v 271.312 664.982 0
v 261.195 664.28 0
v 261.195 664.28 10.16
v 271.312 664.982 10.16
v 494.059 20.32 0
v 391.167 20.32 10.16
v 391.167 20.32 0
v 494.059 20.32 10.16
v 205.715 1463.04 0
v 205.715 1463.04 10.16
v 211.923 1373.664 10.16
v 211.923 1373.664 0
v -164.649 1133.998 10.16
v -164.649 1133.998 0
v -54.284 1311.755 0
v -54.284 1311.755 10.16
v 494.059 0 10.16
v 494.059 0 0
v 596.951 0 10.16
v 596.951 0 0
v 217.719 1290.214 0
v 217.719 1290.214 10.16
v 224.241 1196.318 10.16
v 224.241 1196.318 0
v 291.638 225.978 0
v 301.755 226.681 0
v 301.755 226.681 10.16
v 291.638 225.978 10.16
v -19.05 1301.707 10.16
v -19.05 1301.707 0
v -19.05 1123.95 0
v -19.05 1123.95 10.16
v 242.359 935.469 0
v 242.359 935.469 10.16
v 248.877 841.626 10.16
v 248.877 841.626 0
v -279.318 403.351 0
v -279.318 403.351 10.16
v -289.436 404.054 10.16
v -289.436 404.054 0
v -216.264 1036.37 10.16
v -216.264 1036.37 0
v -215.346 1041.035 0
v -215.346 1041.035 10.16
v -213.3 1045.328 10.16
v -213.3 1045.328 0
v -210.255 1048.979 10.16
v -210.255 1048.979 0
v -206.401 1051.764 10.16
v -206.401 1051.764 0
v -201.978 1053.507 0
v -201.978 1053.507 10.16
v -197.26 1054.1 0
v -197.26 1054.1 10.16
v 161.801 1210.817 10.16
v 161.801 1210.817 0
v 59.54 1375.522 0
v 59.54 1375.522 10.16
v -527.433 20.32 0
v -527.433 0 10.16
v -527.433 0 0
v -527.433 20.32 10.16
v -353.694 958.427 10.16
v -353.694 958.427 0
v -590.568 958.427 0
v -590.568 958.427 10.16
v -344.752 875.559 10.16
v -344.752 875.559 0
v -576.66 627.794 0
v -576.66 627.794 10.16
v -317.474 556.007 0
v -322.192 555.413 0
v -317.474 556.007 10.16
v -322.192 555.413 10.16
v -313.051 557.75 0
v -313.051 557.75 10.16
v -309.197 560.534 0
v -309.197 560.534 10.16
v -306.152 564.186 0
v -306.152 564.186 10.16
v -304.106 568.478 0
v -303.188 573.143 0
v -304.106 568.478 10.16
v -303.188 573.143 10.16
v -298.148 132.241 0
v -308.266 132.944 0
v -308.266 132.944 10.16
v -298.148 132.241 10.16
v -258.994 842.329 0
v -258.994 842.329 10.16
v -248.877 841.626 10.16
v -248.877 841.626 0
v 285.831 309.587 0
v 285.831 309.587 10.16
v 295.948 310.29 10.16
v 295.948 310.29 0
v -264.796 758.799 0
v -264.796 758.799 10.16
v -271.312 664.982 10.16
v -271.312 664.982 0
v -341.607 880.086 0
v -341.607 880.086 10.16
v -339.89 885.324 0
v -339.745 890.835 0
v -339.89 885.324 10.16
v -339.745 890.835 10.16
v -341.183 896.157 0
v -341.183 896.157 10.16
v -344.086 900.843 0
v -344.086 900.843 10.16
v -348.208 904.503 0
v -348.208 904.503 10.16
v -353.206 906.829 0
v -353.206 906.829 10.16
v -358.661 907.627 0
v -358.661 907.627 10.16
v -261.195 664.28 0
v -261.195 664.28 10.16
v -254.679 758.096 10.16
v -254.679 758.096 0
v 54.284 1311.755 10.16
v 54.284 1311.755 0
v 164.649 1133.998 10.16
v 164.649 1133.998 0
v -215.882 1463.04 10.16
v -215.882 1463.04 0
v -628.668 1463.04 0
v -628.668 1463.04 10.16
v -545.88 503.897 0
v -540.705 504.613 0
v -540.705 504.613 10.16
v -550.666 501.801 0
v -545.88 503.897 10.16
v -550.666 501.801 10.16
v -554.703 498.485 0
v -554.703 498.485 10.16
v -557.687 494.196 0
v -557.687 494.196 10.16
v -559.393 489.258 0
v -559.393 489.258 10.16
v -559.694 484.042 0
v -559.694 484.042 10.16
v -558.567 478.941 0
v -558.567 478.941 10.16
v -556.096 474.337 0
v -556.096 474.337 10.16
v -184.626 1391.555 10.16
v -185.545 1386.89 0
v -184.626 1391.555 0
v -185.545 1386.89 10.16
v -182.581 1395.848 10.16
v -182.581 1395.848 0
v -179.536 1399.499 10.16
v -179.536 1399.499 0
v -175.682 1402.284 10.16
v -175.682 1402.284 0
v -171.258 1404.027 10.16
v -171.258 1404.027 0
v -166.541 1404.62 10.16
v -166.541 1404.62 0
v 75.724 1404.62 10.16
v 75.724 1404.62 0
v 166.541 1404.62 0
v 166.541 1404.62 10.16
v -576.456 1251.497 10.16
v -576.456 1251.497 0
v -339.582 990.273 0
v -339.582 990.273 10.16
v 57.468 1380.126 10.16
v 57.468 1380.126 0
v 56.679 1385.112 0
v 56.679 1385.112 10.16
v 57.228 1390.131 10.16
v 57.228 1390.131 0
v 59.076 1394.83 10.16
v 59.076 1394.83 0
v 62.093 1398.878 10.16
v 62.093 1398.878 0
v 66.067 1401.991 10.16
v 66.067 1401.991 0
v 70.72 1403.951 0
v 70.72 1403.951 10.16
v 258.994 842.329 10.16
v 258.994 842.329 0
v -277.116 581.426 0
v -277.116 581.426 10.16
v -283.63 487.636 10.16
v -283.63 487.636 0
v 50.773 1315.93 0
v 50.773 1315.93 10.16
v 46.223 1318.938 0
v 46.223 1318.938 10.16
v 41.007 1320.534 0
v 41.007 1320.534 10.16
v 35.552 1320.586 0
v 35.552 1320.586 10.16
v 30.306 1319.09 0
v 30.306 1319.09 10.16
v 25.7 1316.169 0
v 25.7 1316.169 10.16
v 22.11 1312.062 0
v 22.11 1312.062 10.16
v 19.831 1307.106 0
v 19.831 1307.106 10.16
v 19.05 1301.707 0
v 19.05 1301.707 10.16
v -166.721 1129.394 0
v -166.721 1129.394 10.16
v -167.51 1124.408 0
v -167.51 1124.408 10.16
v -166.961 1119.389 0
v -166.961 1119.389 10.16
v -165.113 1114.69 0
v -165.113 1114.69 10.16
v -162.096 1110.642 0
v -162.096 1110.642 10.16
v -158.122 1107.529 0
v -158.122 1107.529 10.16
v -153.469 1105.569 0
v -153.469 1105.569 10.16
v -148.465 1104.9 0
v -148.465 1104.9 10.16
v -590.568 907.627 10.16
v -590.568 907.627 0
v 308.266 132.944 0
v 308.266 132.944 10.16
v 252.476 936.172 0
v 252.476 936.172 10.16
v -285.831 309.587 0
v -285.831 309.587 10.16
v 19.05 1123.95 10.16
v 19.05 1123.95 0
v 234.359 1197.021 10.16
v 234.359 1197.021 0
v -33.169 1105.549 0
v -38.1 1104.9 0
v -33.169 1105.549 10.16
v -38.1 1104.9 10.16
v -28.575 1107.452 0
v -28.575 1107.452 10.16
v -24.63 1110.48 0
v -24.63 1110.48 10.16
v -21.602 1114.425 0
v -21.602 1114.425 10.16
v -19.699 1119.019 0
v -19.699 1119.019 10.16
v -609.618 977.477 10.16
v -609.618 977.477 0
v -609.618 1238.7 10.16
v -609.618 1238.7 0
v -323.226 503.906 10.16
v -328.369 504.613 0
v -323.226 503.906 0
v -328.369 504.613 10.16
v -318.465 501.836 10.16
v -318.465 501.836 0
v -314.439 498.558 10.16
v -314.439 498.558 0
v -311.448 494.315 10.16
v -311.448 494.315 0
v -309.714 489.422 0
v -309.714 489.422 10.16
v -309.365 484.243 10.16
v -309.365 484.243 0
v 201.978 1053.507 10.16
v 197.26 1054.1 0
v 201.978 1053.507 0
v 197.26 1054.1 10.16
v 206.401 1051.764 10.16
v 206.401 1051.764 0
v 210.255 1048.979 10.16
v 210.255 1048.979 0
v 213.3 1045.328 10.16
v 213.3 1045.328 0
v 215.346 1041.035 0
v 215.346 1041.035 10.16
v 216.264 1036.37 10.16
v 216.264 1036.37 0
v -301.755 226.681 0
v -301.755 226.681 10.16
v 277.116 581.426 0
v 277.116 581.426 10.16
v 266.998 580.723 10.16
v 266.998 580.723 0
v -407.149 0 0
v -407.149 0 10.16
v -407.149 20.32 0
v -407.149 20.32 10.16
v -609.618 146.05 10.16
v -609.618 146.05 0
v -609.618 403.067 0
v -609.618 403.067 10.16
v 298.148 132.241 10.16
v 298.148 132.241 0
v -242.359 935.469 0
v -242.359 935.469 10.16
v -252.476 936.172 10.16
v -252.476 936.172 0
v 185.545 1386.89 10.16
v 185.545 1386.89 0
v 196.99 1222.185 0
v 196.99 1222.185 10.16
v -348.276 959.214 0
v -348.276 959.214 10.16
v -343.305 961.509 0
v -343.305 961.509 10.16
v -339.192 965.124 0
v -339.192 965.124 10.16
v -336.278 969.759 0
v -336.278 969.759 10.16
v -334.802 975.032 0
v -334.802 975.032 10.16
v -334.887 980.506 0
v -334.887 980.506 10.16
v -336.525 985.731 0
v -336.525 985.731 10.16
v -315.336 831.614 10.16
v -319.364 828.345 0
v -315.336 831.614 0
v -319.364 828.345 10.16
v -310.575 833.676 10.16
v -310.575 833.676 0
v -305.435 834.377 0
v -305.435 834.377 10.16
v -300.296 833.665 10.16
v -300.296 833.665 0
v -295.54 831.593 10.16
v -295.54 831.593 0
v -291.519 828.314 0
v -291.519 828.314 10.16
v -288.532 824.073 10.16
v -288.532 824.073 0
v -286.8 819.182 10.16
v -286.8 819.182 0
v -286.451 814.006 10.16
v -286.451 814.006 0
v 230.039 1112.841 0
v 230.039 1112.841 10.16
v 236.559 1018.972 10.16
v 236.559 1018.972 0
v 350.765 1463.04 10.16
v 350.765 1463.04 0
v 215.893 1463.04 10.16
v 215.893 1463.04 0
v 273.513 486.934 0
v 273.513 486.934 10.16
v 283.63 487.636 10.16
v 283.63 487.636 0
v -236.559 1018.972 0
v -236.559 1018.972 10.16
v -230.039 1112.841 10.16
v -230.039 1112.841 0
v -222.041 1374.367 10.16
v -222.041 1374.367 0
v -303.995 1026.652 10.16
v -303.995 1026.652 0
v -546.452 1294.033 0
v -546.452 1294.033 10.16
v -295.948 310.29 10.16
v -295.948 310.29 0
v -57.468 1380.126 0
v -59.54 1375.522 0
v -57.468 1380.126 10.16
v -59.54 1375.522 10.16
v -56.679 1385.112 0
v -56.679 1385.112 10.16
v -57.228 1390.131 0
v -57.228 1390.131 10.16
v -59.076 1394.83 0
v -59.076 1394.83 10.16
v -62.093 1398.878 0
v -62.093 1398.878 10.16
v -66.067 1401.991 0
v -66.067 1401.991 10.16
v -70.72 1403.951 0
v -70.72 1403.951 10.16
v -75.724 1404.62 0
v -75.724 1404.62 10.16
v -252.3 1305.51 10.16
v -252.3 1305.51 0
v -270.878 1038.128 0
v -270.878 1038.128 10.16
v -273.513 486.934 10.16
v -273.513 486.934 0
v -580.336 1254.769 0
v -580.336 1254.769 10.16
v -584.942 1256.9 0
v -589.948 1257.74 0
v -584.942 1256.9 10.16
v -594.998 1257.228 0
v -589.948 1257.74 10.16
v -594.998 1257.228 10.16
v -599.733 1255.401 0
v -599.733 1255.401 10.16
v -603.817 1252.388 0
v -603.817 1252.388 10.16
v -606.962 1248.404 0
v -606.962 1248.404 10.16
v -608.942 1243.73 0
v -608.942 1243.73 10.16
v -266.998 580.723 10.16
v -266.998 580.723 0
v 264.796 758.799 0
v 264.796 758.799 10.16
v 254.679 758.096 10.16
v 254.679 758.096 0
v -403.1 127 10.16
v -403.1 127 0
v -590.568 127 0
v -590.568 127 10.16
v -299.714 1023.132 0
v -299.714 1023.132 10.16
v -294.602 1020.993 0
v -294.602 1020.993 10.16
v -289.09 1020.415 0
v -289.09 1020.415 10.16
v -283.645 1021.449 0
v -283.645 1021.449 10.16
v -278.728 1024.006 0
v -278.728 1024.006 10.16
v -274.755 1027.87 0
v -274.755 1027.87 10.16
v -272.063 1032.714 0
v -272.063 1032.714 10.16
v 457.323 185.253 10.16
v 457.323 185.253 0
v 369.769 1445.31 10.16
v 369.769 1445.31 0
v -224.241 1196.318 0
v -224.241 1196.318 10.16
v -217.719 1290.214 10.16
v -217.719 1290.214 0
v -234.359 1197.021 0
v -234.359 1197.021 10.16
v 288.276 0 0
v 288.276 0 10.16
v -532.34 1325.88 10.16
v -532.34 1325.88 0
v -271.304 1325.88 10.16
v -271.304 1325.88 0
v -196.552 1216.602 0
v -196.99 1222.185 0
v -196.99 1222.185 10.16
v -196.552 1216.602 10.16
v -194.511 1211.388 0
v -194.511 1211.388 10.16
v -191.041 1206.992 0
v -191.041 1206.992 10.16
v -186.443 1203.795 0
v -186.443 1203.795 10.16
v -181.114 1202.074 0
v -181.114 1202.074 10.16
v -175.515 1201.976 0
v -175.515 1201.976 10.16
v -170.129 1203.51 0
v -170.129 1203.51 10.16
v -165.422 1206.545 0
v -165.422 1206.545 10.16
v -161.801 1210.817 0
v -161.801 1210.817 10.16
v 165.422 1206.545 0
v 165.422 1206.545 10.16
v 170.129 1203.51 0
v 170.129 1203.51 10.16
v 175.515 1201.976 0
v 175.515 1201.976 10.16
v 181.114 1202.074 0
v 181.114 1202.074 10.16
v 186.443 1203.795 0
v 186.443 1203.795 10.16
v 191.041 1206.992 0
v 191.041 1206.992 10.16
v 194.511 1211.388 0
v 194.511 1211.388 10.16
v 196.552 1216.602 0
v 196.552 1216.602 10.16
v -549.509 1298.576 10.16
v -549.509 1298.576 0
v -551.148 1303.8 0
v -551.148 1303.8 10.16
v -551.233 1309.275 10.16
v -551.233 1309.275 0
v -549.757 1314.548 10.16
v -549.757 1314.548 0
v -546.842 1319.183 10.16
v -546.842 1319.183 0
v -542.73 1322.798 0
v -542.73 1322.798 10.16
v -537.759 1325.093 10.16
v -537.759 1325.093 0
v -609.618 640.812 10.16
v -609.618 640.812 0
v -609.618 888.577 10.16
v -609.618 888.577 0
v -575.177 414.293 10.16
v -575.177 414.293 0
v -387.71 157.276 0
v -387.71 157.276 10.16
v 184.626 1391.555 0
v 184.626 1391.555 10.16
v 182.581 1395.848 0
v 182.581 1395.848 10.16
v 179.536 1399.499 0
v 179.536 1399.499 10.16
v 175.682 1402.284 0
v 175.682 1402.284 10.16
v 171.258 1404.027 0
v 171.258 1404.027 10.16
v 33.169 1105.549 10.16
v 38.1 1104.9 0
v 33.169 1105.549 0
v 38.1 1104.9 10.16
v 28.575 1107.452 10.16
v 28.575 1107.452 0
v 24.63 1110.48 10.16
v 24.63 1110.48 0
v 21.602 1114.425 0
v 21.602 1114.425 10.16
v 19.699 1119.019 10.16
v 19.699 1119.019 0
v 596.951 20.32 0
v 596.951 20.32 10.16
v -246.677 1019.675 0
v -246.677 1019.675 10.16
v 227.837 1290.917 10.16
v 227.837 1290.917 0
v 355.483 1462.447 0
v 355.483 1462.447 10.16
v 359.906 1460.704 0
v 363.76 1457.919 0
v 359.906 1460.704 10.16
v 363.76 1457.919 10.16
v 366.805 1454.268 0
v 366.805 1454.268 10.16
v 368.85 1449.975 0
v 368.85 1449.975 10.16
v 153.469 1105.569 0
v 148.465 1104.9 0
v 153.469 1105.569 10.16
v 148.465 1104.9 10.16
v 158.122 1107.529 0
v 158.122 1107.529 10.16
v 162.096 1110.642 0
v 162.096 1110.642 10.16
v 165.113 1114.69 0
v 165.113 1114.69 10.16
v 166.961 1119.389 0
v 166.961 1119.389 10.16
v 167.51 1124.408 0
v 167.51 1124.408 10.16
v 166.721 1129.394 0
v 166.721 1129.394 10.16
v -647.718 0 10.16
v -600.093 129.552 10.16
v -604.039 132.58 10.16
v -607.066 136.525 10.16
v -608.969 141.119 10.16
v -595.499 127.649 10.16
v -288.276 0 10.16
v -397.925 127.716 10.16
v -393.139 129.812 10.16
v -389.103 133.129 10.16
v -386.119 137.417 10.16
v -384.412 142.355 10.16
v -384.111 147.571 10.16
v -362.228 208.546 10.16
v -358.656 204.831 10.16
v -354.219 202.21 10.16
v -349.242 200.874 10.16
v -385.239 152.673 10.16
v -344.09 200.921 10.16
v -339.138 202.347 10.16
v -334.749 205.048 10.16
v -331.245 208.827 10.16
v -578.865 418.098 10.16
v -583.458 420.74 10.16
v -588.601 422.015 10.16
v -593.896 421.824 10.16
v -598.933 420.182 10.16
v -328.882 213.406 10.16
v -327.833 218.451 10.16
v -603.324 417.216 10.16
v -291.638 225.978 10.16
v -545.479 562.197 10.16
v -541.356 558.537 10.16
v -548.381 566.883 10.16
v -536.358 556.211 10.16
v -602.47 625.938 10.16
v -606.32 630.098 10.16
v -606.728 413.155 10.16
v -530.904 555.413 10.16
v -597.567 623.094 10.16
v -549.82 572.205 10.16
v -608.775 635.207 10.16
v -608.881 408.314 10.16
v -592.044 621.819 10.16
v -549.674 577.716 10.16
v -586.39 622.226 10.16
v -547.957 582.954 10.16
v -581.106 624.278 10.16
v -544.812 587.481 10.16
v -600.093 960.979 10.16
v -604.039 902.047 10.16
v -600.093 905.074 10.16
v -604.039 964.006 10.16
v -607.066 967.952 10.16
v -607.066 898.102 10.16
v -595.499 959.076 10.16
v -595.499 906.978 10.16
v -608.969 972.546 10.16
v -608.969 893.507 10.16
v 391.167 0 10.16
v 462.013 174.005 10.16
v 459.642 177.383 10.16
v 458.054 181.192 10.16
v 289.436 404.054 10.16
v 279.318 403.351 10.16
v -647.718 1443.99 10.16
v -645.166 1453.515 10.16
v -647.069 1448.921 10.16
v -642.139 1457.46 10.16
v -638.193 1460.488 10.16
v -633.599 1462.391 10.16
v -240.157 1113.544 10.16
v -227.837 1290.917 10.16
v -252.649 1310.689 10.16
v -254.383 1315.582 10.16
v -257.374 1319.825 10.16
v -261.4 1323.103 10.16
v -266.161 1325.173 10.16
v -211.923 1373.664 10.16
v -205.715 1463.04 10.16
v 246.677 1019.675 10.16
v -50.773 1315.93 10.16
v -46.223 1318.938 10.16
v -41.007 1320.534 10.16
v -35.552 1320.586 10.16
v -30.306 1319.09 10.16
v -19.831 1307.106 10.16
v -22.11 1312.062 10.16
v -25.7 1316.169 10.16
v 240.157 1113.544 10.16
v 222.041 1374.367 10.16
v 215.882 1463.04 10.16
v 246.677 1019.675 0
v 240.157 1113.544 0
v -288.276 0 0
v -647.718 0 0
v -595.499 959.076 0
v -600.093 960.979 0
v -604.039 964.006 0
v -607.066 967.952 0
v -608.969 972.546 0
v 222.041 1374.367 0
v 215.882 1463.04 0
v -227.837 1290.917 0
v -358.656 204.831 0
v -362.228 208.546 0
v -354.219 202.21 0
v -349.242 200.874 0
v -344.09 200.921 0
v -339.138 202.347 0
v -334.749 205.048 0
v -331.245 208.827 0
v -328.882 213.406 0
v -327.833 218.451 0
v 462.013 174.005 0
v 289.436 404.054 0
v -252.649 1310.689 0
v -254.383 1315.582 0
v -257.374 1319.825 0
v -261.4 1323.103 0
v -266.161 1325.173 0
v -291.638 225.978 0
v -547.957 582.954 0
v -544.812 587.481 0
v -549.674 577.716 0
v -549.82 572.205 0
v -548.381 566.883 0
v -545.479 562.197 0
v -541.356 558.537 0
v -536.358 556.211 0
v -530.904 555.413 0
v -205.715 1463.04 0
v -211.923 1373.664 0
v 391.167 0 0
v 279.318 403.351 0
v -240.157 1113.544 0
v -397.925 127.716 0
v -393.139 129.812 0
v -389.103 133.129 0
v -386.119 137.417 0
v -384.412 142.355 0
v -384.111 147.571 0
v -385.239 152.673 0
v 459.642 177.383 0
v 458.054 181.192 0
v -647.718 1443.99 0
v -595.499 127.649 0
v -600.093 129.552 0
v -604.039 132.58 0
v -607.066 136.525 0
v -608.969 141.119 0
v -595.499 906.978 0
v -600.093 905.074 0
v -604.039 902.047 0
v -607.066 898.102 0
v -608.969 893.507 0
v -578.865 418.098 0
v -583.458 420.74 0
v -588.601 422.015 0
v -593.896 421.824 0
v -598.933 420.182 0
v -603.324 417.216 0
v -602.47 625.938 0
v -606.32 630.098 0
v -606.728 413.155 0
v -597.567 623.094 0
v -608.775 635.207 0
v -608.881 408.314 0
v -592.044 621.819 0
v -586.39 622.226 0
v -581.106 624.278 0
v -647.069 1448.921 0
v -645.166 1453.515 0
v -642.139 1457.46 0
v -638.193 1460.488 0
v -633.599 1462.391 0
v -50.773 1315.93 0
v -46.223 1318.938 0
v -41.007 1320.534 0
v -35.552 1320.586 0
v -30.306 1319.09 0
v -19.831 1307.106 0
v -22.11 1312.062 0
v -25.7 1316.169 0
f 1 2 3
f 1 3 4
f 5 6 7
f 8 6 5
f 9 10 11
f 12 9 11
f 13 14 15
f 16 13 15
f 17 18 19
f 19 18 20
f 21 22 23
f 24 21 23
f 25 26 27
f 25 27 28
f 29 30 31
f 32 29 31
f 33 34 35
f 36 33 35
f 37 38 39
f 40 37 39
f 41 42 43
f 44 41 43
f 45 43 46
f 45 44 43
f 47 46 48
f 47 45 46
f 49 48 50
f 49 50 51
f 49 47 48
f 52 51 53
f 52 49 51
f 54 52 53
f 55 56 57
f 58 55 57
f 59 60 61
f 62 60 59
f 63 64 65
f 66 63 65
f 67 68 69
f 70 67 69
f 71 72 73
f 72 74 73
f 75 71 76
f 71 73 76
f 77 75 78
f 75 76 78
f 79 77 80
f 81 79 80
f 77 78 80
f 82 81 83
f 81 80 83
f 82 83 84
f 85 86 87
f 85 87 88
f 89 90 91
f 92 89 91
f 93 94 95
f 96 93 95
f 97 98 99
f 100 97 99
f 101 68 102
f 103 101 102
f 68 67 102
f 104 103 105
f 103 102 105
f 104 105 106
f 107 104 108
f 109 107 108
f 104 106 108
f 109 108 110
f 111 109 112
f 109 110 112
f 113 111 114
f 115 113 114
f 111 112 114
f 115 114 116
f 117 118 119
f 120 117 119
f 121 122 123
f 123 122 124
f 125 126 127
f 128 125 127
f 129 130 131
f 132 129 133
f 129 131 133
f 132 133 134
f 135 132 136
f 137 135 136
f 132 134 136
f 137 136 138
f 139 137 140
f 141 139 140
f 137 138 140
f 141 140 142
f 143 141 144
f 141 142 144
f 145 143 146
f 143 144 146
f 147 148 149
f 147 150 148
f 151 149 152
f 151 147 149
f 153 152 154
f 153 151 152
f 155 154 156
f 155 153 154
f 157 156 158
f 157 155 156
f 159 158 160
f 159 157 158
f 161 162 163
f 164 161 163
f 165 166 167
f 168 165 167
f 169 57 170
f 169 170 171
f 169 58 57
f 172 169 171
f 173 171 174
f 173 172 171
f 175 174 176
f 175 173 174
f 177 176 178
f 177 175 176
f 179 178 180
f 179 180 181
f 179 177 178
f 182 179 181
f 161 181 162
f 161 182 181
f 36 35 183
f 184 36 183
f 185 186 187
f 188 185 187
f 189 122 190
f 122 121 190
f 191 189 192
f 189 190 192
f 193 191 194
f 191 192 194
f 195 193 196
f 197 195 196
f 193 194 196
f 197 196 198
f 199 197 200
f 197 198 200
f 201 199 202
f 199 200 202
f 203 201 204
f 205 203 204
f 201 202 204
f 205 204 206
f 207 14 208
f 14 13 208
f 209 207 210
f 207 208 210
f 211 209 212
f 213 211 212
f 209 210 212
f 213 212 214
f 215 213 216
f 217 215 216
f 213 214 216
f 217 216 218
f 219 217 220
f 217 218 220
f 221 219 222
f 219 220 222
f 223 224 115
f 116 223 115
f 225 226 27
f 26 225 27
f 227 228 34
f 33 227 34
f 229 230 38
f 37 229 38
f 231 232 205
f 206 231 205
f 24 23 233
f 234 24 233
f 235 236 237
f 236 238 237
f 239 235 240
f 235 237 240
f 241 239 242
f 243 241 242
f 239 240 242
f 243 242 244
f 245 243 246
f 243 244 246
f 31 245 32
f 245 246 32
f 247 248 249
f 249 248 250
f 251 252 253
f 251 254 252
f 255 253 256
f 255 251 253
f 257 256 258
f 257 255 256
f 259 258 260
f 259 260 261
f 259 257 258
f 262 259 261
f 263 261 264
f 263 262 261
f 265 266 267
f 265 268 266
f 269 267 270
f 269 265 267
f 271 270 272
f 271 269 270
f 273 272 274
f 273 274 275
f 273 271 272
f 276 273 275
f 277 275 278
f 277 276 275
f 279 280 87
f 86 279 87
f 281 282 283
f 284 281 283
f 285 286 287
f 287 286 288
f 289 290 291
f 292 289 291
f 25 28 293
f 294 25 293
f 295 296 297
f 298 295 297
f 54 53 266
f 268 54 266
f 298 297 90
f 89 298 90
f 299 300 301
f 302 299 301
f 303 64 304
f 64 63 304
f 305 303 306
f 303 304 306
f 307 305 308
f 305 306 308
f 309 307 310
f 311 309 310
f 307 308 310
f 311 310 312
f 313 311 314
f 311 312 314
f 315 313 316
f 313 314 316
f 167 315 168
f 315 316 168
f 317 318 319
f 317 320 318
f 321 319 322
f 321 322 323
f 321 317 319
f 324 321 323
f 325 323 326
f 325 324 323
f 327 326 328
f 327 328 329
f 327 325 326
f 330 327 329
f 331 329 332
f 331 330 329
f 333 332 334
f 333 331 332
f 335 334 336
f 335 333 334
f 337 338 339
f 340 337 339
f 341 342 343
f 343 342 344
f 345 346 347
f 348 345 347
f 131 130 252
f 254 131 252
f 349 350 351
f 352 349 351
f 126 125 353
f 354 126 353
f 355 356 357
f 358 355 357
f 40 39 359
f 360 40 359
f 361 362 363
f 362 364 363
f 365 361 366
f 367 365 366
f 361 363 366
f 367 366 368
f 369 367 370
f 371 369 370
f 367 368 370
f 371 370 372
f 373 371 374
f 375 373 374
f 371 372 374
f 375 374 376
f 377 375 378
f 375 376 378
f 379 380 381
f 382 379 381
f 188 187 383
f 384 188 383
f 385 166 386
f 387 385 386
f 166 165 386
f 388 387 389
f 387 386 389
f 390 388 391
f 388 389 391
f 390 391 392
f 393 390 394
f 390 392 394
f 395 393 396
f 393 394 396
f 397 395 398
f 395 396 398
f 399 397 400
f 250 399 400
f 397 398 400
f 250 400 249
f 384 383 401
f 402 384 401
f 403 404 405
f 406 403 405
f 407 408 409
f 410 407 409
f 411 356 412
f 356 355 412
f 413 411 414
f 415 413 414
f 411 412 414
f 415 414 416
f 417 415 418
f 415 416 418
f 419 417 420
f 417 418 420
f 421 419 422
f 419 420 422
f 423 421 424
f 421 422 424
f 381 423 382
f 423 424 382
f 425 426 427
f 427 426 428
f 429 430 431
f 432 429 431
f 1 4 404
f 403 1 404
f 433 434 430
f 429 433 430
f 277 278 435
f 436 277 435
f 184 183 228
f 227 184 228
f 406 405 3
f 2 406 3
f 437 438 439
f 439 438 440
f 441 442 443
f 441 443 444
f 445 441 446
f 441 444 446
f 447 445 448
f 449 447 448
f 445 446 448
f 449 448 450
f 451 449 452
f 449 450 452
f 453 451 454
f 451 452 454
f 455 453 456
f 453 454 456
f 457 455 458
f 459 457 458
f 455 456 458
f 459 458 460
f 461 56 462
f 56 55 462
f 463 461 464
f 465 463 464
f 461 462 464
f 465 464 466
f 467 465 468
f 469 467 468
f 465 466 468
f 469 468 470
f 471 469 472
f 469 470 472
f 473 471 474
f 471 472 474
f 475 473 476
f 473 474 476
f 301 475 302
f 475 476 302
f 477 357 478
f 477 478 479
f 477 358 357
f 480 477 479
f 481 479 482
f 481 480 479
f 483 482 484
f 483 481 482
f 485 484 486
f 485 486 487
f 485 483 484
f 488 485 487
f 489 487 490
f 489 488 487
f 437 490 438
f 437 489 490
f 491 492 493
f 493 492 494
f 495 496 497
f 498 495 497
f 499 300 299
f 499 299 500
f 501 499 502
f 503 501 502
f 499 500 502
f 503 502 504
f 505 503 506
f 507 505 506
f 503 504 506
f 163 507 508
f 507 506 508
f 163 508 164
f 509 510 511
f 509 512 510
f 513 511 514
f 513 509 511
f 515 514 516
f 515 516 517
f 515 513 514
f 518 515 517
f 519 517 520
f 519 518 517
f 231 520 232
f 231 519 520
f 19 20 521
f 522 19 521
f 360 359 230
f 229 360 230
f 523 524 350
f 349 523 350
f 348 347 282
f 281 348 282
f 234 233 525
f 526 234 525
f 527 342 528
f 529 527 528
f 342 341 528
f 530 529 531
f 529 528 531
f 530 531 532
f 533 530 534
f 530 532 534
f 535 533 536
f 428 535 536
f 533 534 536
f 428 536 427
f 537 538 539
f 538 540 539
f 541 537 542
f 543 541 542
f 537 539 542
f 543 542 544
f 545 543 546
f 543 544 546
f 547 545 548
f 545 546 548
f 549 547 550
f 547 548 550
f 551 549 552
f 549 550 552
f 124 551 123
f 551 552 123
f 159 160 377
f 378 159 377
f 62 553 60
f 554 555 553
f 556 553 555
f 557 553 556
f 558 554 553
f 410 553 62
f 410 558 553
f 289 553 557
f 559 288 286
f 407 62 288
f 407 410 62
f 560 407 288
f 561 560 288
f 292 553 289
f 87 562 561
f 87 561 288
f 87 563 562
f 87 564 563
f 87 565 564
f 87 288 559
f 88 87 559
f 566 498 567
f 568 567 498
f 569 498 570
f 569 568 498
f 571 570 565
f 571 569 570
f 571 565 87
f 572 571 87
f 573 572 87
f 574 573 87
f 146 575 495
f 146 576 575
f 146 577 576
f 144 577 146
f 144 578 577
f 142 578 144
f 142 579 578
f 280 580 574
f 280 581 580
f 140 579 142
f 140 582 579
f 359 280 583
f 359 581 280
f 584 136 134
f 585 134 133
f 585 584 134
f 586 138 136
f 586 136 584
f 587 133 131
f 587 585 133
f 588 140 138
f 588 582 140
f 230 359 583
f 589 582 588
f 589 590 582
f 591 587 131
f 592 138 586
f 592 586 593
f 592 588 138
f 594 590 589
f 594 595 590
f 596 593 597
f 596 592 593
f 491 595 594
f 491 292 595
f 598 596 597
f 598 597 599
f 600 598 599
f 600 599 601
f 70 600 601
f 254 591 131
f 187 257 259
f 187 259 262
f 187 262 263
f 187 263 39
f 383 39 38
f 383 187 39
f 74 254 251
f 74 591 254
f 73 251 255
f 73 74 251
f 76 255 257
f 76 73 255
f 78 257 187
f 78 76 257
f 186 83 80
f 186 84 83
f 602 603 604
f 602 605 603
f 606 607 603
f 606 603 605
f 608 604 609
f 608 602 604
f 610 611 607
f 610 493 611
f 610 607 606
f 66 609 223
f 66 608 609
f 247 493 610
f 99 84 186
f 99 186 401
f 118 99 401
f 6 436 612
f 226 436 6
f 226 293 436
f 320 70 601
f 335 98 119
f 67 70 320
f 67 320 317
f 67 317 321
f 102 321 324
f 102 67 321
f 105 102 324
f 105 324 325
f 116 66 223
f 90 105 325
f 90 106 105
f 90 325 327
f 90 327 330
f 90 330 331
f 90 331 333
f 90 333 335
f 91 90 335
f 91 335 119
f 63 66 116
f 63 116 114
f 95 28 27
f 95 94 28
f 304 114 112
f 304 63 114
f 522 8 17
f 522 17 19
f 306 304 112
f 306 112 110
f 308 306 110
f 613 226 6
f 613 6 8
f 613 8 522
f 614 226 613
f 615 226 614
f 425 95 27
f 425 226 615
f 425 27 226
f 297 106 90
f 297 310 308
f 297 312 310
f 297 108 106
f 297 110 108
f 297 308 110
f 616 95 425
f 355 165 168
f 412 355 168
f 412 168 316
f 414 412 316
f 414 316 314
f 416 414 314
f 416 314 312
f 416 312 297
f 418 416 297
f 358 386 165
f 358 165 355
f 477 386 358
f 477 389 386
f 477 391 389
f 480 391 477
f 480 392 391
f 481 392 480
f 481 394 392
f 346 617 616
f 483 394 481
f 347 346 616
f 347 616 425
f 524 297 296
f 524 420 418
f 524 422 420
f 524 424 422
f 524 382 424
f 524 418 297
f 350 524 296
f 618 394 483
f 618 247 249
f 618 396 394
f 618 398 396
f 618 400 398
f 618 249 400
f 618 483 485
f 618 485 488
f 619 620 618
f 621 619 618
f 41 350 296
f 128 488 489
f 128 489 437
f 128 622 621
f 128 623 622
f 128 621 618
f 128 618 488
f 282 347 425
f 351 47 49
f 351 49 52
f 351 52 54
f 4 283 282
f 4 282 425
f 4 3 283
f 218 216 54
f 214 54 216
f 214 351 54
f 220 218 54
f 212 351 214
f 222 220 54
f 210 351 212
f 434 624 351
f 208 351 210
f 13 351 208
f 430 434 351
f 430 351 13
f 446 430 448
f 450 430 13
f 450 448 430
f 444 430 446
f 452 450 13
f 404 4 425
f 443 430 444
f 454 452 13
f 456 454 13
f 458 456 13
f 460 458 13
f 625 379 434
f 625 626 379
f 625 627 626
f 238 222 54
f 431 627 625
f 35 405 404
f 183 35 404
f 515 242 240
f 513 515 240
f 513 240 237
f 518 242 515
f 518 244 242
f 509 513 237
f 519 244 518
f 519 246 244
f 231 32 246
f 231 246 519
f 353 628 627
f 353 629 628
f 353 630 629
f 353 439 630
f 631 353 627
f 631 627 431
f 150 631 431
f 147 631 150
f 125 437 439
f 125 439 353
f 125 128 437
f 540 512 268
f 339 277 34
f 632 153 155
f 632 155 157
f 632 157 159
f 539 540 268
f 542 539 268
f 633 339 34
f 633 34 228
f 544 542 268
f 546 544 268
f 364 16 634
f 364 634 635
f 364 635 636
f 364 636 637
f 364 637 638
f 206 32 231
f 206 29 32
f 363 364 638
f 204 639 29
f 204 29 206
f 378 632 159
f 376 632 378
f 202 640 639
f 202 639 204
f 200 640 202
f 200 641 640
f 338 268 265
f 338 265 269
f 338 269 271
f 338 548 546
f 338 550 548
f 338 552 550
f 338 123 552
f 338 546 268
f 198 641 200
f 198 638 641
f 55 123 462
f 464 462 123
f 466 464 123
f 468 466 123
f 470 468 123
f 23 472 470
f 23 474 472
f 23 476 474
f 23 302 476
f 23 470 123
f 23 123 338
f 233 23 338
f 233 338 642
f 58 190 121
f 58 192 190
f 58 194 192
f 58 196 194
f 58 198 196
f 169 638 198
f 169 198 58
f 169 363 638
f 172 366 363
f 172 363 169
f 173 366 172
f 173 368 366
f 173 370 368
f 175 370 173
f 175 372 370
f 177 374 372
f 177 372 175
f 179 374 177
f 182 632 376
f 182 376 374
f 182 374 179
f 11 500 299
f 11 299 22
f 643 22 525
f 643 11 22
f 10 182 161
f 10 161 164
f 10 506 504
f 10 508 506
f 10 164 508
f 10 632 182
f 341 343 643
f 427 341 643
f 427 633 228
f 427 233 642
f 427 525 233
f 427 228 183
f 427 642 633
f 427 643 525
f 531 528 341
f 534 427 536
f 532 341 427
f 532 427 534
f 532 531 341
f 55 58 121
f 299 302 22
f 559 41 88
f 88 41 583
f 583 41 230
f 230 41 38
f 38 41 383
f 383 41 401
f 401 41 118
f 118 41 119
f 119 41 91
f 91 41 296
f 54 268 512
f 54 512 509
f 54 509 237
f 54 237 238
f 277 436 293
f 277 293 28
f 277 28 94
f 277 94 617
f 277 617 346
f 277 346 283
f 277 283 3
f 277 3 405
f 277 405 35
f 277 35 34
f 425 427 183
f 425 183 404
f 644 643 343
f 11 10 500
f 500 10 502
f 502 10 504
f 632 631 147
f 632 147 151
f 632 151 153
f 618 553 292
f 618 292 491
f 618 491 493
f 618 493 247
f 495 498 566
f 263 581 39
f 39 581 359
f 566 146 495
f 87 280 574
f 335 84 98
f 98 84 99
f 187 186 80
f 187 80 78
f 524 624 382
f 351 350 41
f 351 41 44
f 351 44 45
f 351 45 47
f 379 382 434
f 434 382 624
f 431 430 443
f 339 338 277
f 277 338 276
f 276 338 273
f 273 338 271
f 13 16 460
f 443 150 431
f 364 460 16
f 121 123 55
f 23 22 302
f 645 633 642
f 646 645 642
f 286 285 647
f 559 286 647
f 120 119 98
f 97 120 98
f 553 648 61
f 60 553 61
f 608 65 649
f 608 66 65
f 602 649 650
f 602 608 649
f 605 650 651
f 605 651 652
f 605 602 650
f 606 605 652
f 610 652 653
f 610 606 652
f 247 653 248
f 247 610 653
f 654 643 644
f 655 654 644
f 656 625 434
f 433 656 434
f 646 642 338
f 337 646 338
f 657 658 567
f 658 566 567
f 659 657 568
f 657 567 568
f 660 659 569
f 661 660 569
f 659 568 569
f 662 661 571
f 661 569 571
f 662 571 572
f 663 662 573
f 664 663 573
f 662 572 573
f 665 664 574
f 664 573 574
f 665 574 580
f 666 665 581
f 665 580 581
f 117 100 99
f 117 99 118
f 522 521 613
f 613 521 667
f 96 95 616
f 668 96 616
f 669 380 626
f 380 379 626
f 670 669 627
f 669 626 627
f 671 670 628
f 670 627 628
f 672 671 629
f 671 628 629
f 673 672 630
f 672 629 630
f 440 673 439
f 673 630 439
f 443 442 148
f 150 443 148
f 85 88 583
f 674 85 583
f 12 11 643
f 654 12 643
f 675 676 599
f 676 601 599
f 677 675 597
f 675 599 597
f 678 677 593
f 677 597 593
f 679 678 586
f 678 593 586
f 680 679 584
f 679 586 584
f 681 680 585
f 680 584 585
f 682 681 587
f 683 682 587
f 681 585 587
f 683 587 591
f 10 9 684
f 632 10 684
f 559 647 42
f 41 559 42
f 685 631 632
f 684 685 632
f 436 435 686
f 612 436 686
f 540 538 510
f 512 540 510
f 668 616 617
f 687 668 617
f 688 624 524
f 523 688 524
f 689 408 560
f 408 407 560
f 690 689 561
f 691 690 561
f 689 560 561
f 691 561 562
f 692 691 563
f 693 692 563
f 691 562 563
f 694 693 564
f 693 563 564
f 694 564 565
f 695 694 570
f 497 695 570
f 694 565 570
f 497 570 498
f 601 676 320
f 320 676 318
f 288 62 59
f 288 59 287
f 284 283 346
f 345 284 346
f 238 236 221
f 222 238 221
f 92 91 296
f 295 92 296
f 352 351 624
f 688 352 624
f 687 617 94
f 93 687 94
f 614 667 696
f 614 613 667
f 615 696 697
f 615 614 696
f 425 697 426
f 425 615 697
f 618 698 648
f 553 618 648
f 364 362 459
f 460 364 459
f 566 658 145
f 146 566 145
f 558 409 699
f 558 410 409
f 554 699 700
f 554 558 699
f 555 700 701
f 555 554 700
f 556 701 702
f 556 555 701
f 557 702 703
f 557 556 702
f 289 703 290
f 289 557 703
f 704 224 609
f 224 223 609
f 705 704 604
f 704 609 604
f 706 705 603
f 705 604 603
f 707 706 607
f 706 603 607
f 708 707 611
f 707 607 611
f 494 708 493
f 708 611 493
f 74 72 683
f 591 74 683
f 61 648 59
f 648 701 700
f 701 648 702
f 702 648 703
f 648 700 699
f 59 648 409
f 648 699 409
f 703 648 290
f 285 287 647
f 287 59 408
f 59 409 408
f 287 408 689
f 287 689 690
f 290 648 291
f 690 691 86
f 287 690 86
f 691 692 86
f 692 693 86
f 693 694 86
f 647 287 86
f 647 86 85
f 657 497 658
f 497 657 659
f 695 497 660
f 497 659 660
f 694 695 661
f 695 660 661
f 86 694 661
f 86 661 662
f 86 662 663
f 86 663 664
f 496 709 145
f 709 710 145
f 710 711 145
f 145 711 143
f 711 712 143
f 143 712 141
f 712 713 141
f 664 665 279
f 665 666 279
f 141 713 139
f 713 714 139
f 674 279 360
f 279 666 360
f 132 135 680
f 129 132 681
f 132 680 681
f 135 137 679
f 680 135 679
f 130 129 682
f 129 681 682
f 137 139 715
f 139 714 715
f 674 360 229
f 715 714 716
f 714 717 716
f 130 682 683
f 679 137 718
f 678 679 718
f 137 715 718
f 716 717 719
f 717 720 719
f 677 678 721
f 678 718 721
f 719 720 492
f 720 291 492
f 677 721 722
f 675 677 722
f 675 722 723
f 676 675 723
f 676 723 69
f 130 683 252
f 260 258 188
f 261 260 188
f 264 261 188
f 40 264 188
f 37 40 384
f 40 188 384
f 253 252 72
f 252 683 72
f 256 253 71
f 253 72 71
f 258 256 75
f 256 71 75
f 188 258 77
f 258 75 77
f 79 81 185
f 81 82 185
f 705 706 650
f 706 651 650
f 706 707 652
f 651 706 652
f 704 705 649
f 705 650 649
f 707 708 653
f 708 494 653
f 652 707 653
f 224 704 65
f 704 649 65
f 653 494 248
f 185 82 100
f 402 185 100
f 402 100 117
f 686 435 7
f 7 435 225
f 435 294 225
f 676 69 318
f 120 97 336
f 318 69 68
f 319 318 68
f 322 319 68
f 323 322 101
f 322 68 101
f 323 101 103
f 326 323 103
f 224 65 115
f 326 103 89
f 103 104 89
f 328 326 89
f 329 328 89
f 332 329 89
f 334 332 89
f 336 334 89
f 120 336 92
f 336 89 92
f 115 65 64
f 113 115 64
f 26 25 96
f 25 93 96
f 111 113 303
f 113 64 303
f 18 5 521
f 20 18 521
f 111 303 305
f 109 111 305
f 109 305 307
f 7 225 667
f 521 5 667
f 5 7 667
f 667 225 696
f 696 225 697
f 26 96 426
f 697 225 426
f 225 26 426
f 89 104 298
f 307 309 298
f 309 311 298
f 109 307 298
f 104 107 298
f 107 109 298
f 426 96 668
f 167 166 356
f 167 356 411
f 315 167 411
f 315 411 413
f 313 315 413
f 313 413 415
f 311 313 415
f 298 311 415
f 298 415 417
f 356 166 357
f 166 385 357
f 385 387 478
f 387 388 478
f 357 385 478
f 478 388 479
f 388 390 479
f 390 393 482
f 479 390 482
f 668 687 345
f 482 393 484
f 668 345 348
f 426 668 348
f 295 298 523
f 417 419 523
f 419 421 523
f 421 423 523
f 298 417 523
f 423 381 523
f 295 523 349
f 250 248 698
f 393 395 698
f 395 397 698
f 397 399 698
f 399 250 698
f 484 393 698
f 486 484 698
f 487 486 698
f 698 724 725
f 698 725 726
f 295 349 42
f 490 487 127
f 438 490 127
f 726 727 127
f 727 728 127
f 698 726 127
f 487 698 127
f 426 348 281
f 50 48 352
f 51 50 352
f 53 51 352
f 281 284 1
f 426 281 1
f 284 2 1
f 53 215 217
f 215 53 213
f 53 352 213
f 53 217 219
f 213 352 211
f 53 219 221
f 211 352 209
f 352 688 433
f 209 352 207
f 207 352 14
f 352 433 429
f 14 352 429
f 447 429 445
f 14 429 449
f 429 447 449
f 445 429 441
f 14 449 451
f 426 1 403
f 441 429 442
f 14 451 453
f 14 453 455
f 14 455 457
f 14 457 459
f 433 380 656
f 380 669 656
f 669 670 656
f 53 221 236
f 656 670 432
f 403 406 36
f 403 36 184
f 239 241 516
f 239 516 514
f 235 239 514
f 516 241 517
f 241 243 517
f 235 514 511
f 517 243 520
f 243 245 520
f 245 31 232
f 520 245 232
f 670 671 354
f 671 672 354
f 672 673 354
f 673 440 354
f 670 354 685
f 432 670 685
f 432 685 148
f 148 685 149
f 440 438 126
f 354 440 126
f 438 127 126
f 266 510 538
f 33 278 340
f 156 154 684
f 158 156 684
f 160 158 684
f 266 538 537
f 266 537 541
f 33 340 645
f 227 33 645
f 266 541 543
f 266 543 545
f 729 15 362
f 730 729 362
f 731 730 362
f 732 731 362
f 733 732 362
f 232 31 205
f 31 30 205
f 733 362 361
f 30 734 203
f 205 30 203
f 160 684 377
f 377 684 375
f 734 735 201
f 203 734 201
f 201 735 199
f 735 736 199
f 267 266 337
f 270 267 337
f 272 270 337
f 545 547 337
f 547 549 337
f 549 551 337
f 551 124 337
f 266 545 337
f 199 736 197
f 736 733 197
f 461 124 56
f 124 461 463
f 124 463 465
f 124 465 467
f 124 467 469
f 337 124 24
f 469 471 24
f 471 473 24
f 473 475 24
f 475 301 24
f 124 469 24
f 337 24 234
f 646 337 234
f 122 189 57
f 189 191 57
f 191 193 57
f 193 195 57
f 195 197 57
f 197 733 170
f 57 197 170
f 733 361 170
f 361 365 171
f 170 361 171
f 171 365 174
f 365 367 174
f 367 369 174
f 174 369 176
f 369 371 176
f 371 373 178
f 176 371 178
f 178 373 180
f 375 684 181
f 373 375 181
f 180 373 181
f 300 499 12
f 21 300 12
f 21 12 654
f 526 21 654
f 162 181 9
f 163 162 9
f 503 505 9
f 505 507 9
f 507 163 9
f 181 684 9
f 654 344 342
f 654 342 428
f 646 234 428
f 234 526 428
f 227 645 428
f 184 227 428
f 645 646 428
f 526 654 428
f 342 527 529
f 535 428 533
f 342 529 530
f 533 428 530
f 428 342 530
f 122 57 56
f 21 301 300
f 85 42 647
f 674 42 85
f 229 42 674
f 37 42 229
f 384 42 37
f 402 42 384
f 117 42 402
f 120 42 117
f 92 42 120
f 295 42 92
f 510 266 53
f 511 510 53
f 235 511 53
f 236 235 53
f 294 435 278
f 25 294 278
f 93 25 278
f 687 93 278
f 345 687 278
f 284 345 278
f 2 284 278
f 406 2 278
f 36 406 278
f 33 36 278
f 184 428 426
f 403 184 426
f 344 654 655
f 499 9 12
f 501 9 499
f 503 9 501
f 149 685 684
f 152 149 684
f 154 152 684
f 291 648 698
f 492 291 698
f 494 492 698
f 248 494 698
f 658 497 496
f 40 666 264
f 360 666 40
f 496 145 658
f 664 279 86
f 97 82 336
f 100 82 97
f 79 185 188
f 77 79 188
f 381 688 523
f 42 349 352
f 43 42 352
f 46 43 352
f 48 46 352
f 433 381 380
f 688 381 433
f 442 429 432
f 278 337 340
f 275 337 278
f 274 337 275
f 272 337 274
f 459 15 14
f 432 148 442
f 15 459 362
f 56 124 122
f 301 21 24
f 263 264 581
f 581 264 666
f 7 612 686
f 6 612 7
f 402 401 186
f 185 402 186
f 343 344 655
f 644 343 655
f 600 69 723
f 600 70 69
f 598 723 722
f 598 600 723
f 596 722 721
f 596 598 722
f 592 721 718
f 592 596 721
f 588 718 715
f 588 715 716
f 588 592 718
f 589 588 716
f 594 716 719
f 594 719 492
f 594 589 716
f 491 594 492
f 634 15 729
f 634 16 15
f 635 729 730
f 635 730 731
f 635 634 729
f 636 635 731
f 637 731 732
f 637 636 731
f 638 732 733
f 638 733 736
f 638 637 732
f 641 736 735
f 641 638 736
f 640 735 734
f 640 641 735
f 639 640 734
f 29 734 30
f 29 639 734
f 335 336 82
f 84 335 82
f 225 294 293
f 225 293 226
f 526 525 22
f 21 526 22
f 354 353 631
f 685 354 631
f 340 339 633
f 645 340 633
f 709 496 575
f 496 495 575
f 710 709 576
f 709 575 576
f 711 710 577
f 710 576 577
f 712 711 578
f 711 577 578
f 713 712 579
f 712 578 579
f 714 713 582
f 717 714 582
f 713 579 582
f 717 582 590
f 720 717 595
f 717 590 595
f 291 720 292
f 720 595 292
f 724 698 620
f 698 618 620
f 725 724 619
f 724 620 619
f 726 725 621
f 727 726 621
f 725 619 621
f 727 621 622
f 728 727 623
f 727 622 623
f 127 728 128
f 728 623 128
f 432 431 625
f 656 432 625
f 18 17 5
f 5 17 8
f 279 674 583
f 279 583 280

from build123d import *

# Parameters (mm, degrees)
BOSS_EXTRUDE1_DEPTH = 10.16
FILLET1_R           = 19.05
SKETCH2_W           = 120.284747719
SKETCH2_H           = 20.32
SKETCH2_W_2         = 102.891608588
CUT_EXTRUDE1_DEPTH  = 12.7


with BuildPart() as part:
    # Sketch1 → Boss-Extrude1 (new body)
    with BuildSketch(Plane.XY):
        Polygon((-288.275887252, 0), (-215.032557346, 1054.1), (215.032557346, 1054.1), (288.275887252, 0), (596.950713016, 0), (596.950713016, 20.32), (457.769290722, 178.8375841), (368.537470958, 1463.04), (215.892500906, 1463.04), (-205.715298803, 1463.040000035), (-647.718210796, 1463.04), (-647.718210796, 0), align=None)
        Polygon((-609.618210796, 127), (-609.618210796, 461.510956689), (-365.626284392, 127), align=None, mode=Mode.SUBTRACT)
        Polygon((-609.618210796, 592.582701044), (-609.618210796, 907.626666667), (-314.736774564, 907.626666667), align=None, mode=Mode.SUBTRACT)
        Polygon((-282.735998162, 867.476761947), (-304.419486117, 555.413333333), (-574.827649063, 555.413333333), align=None, mode=Mode.SUBTRACT)
        Polygon((-307.949285149, 504.613333333), (-331.453012037, 166.353473425), (-578.179384354, 504.613333333), align=None, mode=Mode.SUBTRACT)
        Polygon((-609.618210796, 958.426666667), (-609.618210796, 1288.067621407), (-310.704175954, 958.426666667), align=None, mode=Mode.SUBTRACT)
        Polygon((-575.330448642, 1325.88), (-250.884200804, 1325.88), (-273.976047339, 993.547820907), align=None, mode=Mode.SUBTRACT)
        Polygon((19.05, 1104.9), (19.05, 1368.504716774), (182.716004616, 1104.9), align=None, mode=Mode.SUBTRACT)
        Polygon((41.473134849, 1404.62), (184.313325179, 1404.62), (202.313466912, 1145.566384812), align=None, mode=Mode.SUBTRACT)
        Polygon((-184.313325179, 1404.62), (-41.473134849, 1404.62), (-202.313466912, 1145.566384812), align=None, mode=Mode.SUBTRACT)
        Polygon((-19.05, 1368.504716774), (-19.05, 1104.9), (-182.716004616, 1104.9), align=None, mode=Mode.SUBTRACT)
    extrude(amount=BOSS_EXTRUDE1_DEPTH)

    # Fillet1
    fillet1_edges = [part.edges().sort_by_distance(p)[0] for p in [
        (19.05, 1368.504716774, 5.08),
        (19.05, 1104.9, 5.08),
        (182.716004616, 1104.9, 5.08),
        (-250.884200804, 1325.88, 5.08),
        (-575.330448642, 1325.88, 5.08),
        (-273.976047339, 993.547820907, 5.08),
        (-647.718210796, 1463.04, 5.08),
        (368.537470958, 1463.04, 5.08),
        (457.769290722, 178.8375841, 5.08),
        (215.032557346, 1054.1, 5.08),
        (-215.032557346, 1054.1, 5.08),
        (-609.618210796, 1288.067621407, 5.08),
        (-609.618210796, 958.426666667, 5.08),
        (-310.704175954, 958.426666667, 5.08),
        (-609.618210796, 461.510956689, 5.08),
        (-609.618210796, 127, 5.08),
        (-365.626284392, 127, 5.08),
        (-41.473134849, 1404.62, 5.08),
        (-184.313325179, 1404.62, 5.08),
        (-202.313466912, 1145.566384812, 5.08),
        (-182.716004616, 1104.9, 5.08),
        (-19.05, 1104.9, 5.08),
        (-19.05, 1368.504716774, 5.08),
        (184.313325179, 1404.62, 5.08),
        (41.473134849, 1404.62, 5.08),
        (202.313466912, 1145.566384812, 5.08),
        (-578.179384354, 504.613333333, 5.08),
        (-331.453012037, 166.353473425, 5.08),
        (-307.949285149, 504.613333333, 5.08),
        (-609.618210796, 907.626666667, 5.08),
        (-609.618210796, 592.582701044, 5.08),
        (-314.736774564, 907.626666667, 5.08),
        (-574.827649063, 555.413333333, 5.08),
        (-304.419486117, 555.413333333, 5.08),
        (-282.735998162, 867.476761947, 5.08),
    ]]
    fillet(fillet1_edges, radius=FILLET1_R)

    # Sketch2 → Cut-Extrude1 (cut)
    with BuildSketch(Plane.XY.offset(10.16)):
        with Locations((-467.291089218, 10.16)):
            Rectangle(SKETCH2_W, SKETCH2_H)
        with Locations((442.613300134, 10.16)):
            Rectangle(SKETCH2_W_2, SKETCH2_H)
        Polygon((211.92306481, 1373.664189215), (222.040744894, 1374.366931824), (215.881789204, 1463.040000035), (205.715298803, 1463.040000035), align=None)
        Polygon((234.358656272, 1197.020795404), (227.836927701, 1290.916856945), (217.719247617, 1290.214114336), (224.240976188, 1196.318052795), align=None)
        Polygon((246.676567651, 1019.674658983), (240.15668194, 1113.544188093), (230.039001856, 1112.841445484), (236.558887567, 1018.971916374), align=None)
        Polygon((258.99447903, 842.328522563), (252.476436179, 936.171519242), (242.358756095, 935.468776633), (248.876798945, 841.625779953), align=None)
        Polygon((271.312390408, 664.982386142), (264.796190418, 758.798850391), (254.678510334, 758.096107781), (261.194710324, 664.279643533), align=None)
        Polygon((283.630301787, 487.636249721), (277.115944656, 581.426181539), (266.998264572, 580.72343893), (273.512621703, 486.933507112), align=None)
        Polygon((295.948213166, 310.290113301), (289.435698895, 404.053512688), (279.318018811, 403.350770078), (285.830533081, 309.587370692), align=None)
        Polygon((308.266124544, 132.94397688), (301.755453134, 226.680843836), (291.63777305, 225.978101227), (298.14844446, 132.241234271), align=None)
        Polygon((-301.755453134, 226.680843836), (-308.266124544, 132.94397688), (-298.14844446, 132.241234271), (-291.63777305, 225.978101227), align=None)
        Polygon((-289.435698895, 404.053512688), (-295.948213166, 310.290113301), (-285.830533081, 309.587370692), (-279.318018811, 403.350770078), align=None)
        Polygon((-277.115944656, 581.426181539), (-283.630301787, 487.636249721), (-273.512621703, 486.933507112), (-266.998264572, 580.72343893), align=None)
        Polygon((-264.796190418, 758.798850391), (-271.312390408, 664.982386142), (-261.194710324, 664.279643533), (-254.678510334, 758.096107781), align=None)
        Polygon((-252.476436179, 936.171519242), (-258.99447903, 842.328522563), (-248.876798945, 841.625779953), (-242.358756095, 935.468776633), align=None)
        Polygon((-240.15668194, 1113.544188093), (-246.676567651, 1019.674658983), (-236.558887567, 1018.971916374), (-230.039001856, 1112.841445484), align=None)
        Polygon((-227.836927701, 1290.916856945), (-234.358656272, 1197.020795404), (-224.240976188, 1196.318052795), (-217.719247617, 1290.214114336), align=None)
        Polygon((-222.040744894, 1374.366931824), (-211.92306481, 1373.664189215), (-205.715298803, 1463.040000035), (-215.881789204, 1463.040000035), align=None)
    extrude(amount=-CUT_EXTRUDE1_DEPTH, mode=Mode.SUBTRACT)


solid = part.part
